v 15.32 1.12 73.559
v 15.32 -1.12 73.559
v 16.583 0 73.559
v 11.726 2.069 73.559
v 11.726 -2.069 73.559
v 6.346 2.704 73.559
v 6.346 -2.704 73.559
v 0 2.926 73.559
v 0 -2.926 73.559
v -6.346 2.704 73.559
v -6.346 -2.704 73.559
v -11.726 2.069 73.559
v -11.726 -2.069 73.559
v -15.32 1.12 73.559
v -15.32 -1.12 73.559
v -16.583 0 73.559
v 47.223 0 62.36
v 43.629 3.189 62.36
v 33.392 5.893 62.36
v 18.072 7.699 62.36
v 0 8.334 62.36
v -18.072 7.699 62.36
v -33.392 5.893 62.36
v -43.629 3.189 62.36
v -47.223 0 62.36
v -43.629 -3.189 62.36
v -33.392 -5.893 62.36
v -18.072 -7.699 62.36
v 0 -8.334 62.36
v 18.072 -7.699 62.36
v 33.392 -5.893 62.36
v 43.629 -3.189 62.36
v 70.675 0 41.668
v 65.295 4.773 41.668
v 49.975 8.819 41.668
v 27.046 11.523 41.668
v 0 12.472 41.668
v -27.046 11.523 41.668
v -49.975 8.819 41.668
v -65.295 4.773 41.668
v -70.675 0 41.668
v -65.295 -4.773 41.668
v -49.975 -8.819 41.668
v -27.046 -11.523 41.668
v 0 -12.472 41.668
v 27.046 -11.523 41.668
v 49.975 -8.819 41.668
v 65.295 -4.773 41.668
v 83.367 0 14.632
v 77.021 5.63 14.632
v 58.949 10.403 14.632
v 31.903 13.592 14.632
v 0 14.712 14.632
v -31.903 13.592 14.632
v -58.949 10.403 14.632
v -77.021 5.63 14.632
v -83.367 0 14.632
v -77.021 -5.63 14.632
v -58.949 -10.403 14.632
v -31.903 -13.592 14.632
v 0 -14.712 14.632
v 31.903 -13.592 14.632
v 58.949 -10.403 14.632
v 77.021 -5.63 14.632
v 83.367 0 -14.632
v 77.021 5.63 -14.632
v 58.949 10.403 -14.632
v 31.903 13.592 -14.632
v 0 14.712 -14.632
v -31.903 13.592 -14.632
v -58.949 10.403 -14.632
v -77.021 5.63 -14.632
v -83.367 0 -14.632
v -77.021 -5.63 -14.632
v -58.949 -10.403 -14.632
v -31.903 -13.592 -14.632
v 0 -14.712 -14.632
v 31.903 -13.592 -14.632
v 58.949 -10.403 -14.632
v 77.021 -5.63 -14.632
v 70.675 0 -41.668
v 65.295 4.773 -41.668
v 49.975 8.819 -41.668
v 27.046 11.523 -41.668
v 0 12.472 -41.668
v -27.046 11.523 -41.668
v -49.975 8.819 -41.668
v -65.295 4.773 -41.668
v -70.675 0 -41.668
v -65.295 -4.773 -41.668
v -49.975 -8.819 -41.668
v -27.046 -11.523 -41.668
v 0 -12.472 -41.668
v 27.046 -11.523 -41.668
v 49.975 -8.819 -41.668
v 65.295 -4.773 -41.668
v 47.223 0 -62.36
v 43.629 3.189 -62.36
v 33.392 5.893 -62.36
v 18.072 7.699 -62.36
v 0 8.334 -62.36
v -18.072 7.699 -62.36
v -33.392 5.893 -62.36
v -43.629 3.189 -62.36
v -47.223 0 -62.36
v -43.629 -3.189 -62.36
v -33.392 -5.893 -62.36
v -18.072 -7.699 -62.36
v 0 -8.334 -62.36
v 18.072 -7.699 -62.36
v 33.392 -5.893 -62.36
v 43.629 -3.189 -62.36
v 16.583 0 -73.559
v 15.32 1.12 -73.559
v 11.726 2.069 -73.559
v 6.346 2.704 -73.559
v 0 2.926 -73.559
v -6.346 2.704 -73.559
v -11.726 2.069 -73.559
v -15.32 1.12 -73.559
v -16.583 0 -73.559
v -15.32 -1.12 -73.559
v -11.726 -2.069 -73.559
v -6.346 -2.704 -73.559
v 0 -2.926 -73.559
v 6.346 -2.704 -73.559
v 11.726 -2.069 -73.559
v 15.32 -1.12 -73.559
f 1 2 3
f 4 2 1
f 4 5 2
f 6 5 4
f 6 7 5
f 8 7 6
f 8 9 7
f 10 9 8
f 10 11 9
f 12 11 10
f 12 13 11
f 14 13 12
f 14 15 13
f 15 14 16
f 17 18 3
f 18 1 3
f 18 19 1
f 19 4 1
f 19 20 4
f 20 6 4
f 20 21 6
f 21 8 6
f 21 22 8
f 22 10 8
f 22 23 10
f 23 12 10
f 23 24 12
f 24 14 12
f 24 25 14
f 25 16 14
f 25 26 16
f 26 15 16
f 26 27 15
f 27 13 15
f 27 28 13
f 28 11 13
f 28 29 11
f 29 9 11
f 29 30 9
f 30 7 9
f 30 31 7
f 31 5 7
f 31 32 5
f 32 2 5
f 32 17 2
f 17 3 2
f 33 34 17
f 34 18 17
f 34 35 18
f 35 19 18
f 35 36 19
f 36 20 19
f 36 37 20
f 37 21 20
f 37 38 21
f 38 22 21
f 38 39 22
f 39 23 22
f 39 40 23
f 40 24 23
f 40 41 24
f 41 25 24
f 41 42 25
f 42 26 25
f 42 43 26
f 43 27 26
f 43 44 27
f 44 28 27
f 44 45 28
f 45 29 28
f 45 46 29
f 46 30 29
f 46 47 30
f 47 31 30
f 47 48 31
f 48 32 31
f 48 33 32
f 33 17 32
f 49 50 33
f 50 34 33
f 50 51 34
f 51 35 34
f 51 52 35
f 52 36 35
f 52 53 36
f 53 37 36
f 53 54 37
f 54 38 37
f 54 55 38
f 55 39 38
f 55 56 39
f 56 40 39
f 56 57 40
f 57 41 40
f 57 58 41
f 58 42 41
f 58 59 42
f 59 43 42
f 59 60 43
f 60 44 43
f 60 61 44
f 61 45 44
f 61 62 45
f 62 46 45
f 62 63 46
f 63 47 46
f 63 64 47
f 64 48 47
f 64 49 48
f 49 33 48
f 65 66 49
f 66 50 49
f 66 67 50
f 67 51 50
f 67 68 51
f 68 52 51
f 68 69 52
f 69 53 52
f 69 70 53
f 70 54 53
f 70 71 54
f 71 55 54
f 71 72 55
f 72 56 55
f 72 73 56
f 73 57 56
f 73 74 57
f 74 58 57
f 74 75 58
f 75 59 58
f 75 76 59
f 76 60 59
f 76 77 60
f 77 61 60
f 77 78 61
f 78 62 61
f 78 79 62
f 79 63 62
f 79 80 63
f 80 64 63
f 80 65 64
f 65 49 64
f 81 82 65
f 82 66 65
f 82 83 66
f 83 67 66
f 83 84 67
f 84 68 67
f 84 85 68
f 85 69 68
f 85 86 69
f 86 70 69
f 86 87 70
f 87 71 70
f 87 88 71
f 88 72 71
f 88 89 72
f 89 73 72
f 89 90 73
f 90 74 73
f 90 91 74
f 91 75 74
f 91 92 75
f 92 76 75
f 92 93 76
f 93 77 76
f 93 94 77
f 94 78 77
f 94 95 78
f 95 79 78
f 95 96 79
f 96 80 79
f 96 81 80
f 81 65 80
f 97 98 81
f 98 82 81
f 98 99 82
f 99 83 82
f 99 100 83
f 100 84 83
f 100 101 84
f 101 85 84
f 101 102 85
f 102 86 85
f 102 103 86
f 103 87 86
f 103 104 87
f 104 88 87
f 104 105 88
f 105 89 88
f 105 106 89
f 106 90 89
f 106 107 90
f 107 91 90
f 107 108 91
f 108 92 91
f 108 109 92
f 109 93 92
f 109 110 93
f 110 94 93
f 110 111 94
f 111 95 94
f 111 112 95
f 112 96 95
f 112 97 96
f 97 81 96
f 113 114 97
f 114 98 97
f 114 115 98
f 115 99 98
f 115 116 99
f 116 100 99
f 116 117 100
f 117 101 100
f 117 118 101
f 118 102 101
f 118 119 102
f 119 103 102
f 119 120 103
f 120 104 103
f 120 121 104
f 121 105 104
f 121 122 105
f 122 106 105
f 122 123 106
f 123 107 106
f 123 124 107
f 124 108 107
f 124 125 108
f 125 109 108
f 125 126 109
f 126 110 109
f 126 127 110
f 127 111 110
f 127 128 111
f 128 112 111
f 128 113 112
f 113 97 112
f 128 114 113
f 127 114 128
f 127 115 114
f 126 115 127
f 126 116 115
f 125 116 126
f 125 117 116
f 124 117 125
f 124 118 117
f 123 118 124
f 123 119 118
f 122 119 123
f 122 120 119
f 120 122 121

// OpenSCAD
// Generated by SolidPython 1.0.1 on 2020-07-29 00:46:52


scale(v = [17, 3, 15]) {
	sphere(r = 5);
}
/***********************************************
*********      SolidPython code:      **********
************************************************
 
# import packages: SolidPython
from solid import *
from solid.utils import *
from itertools import chain, combinations, permutations


class Resize:

    def __init__(self, scad_file):
        self.scad_file = scad_file
        #self.scad_file = import_scad(scad_file)
        # cone/cylinder param:
        self.r1 = 0
        self.r2 = 0
        self.h = 0
        # rectangular prism param:
        self.w = 0
        self.l = 0
        # ellipse param:
        self.r = 0

    # import OpenScad code (file name corresponds to shape)


    # classify shape + parameters
    def assign(self, param1, param2, param3):
        if self.scad_file == 'cone.scad':
            self.r1 = param1
            self.r2 = param2
            self.h = param3
        elif self.scad_file == 'cylinder.scad':
            self.r1 = param1
            self.r2 = param2
            self.h = param3
        elif self.scad_file == 'rectangularPrism.scad':
            self.h = param1
            self.l = param2
            self.w = param3
        else:
            self.r = param1
            self.h = param2

    # resize parameters
    def iterate(self):
        x = range(3, 20, 2)
        i = 1
        if self.scad_file == 'cone.scad':
            tempList = list(permutations(x, 2))
            for temp in tempList:
                param1 = temp[0]
                param2 = temp[1]
                filepath = 'produced_scad_files/' + 'cone' + str(param1) + '_' + str(param2) + '_' + '.scad'
                scad_render_to_file(cylinder(h=param1, r1=param2, r2=0), filepath)

        elif self.scad_file == 'cylinder.scad':
            tempList = list(permutations(x, 3))
            for temp in tempList:
                param1 = temp[0]
                param2 = temp[1]
                filepath = 'produced_scad_files/' + 'cylinder' + str(param1) + '_' + str(param2) + '_' + '.scad'
                scad_render_to_file(cylinder(h=param1, r1=param2, r2=param2), filepath)

        elif self.scad_file == 'rectangularPrism.scad':
            tempList = list(permutations(x, 3))
            for temp in tempList:
                param1 = temp[0]
                param2 = temp[1]
                param3 = temp[2]
                filepath = 'produced_scad_files/' + 'rectangularPrism' + str(param1) + '_' + str(param2) + '_' + str(
                    param3) + '.scad'
                scad_render_to_file(cube(size=(param1, param2, param3)), filepath)

        elif self.scad_file == 'ellipse.scad':
            tempList = list(permutations(x, 4))
            for temp in tempList:
                param1 = temp[0]
                param2 = temp[1]
                param3 = temp[2]
                param4 = temp[3]
                filepath = 'produced_scad_files/' + 'ellipse' + str(param1) + '_' + str(param2) + '_' + str(param3) + '_' + str(param4) + '.scad'
                scad_render_to_file(scale([param1, param2, param3])(sphere(r=param4)), filepath)

    def render_to_scadfile(self):
        scad_render_to_file(scad, 'example.scad') 
 
************************************************/
